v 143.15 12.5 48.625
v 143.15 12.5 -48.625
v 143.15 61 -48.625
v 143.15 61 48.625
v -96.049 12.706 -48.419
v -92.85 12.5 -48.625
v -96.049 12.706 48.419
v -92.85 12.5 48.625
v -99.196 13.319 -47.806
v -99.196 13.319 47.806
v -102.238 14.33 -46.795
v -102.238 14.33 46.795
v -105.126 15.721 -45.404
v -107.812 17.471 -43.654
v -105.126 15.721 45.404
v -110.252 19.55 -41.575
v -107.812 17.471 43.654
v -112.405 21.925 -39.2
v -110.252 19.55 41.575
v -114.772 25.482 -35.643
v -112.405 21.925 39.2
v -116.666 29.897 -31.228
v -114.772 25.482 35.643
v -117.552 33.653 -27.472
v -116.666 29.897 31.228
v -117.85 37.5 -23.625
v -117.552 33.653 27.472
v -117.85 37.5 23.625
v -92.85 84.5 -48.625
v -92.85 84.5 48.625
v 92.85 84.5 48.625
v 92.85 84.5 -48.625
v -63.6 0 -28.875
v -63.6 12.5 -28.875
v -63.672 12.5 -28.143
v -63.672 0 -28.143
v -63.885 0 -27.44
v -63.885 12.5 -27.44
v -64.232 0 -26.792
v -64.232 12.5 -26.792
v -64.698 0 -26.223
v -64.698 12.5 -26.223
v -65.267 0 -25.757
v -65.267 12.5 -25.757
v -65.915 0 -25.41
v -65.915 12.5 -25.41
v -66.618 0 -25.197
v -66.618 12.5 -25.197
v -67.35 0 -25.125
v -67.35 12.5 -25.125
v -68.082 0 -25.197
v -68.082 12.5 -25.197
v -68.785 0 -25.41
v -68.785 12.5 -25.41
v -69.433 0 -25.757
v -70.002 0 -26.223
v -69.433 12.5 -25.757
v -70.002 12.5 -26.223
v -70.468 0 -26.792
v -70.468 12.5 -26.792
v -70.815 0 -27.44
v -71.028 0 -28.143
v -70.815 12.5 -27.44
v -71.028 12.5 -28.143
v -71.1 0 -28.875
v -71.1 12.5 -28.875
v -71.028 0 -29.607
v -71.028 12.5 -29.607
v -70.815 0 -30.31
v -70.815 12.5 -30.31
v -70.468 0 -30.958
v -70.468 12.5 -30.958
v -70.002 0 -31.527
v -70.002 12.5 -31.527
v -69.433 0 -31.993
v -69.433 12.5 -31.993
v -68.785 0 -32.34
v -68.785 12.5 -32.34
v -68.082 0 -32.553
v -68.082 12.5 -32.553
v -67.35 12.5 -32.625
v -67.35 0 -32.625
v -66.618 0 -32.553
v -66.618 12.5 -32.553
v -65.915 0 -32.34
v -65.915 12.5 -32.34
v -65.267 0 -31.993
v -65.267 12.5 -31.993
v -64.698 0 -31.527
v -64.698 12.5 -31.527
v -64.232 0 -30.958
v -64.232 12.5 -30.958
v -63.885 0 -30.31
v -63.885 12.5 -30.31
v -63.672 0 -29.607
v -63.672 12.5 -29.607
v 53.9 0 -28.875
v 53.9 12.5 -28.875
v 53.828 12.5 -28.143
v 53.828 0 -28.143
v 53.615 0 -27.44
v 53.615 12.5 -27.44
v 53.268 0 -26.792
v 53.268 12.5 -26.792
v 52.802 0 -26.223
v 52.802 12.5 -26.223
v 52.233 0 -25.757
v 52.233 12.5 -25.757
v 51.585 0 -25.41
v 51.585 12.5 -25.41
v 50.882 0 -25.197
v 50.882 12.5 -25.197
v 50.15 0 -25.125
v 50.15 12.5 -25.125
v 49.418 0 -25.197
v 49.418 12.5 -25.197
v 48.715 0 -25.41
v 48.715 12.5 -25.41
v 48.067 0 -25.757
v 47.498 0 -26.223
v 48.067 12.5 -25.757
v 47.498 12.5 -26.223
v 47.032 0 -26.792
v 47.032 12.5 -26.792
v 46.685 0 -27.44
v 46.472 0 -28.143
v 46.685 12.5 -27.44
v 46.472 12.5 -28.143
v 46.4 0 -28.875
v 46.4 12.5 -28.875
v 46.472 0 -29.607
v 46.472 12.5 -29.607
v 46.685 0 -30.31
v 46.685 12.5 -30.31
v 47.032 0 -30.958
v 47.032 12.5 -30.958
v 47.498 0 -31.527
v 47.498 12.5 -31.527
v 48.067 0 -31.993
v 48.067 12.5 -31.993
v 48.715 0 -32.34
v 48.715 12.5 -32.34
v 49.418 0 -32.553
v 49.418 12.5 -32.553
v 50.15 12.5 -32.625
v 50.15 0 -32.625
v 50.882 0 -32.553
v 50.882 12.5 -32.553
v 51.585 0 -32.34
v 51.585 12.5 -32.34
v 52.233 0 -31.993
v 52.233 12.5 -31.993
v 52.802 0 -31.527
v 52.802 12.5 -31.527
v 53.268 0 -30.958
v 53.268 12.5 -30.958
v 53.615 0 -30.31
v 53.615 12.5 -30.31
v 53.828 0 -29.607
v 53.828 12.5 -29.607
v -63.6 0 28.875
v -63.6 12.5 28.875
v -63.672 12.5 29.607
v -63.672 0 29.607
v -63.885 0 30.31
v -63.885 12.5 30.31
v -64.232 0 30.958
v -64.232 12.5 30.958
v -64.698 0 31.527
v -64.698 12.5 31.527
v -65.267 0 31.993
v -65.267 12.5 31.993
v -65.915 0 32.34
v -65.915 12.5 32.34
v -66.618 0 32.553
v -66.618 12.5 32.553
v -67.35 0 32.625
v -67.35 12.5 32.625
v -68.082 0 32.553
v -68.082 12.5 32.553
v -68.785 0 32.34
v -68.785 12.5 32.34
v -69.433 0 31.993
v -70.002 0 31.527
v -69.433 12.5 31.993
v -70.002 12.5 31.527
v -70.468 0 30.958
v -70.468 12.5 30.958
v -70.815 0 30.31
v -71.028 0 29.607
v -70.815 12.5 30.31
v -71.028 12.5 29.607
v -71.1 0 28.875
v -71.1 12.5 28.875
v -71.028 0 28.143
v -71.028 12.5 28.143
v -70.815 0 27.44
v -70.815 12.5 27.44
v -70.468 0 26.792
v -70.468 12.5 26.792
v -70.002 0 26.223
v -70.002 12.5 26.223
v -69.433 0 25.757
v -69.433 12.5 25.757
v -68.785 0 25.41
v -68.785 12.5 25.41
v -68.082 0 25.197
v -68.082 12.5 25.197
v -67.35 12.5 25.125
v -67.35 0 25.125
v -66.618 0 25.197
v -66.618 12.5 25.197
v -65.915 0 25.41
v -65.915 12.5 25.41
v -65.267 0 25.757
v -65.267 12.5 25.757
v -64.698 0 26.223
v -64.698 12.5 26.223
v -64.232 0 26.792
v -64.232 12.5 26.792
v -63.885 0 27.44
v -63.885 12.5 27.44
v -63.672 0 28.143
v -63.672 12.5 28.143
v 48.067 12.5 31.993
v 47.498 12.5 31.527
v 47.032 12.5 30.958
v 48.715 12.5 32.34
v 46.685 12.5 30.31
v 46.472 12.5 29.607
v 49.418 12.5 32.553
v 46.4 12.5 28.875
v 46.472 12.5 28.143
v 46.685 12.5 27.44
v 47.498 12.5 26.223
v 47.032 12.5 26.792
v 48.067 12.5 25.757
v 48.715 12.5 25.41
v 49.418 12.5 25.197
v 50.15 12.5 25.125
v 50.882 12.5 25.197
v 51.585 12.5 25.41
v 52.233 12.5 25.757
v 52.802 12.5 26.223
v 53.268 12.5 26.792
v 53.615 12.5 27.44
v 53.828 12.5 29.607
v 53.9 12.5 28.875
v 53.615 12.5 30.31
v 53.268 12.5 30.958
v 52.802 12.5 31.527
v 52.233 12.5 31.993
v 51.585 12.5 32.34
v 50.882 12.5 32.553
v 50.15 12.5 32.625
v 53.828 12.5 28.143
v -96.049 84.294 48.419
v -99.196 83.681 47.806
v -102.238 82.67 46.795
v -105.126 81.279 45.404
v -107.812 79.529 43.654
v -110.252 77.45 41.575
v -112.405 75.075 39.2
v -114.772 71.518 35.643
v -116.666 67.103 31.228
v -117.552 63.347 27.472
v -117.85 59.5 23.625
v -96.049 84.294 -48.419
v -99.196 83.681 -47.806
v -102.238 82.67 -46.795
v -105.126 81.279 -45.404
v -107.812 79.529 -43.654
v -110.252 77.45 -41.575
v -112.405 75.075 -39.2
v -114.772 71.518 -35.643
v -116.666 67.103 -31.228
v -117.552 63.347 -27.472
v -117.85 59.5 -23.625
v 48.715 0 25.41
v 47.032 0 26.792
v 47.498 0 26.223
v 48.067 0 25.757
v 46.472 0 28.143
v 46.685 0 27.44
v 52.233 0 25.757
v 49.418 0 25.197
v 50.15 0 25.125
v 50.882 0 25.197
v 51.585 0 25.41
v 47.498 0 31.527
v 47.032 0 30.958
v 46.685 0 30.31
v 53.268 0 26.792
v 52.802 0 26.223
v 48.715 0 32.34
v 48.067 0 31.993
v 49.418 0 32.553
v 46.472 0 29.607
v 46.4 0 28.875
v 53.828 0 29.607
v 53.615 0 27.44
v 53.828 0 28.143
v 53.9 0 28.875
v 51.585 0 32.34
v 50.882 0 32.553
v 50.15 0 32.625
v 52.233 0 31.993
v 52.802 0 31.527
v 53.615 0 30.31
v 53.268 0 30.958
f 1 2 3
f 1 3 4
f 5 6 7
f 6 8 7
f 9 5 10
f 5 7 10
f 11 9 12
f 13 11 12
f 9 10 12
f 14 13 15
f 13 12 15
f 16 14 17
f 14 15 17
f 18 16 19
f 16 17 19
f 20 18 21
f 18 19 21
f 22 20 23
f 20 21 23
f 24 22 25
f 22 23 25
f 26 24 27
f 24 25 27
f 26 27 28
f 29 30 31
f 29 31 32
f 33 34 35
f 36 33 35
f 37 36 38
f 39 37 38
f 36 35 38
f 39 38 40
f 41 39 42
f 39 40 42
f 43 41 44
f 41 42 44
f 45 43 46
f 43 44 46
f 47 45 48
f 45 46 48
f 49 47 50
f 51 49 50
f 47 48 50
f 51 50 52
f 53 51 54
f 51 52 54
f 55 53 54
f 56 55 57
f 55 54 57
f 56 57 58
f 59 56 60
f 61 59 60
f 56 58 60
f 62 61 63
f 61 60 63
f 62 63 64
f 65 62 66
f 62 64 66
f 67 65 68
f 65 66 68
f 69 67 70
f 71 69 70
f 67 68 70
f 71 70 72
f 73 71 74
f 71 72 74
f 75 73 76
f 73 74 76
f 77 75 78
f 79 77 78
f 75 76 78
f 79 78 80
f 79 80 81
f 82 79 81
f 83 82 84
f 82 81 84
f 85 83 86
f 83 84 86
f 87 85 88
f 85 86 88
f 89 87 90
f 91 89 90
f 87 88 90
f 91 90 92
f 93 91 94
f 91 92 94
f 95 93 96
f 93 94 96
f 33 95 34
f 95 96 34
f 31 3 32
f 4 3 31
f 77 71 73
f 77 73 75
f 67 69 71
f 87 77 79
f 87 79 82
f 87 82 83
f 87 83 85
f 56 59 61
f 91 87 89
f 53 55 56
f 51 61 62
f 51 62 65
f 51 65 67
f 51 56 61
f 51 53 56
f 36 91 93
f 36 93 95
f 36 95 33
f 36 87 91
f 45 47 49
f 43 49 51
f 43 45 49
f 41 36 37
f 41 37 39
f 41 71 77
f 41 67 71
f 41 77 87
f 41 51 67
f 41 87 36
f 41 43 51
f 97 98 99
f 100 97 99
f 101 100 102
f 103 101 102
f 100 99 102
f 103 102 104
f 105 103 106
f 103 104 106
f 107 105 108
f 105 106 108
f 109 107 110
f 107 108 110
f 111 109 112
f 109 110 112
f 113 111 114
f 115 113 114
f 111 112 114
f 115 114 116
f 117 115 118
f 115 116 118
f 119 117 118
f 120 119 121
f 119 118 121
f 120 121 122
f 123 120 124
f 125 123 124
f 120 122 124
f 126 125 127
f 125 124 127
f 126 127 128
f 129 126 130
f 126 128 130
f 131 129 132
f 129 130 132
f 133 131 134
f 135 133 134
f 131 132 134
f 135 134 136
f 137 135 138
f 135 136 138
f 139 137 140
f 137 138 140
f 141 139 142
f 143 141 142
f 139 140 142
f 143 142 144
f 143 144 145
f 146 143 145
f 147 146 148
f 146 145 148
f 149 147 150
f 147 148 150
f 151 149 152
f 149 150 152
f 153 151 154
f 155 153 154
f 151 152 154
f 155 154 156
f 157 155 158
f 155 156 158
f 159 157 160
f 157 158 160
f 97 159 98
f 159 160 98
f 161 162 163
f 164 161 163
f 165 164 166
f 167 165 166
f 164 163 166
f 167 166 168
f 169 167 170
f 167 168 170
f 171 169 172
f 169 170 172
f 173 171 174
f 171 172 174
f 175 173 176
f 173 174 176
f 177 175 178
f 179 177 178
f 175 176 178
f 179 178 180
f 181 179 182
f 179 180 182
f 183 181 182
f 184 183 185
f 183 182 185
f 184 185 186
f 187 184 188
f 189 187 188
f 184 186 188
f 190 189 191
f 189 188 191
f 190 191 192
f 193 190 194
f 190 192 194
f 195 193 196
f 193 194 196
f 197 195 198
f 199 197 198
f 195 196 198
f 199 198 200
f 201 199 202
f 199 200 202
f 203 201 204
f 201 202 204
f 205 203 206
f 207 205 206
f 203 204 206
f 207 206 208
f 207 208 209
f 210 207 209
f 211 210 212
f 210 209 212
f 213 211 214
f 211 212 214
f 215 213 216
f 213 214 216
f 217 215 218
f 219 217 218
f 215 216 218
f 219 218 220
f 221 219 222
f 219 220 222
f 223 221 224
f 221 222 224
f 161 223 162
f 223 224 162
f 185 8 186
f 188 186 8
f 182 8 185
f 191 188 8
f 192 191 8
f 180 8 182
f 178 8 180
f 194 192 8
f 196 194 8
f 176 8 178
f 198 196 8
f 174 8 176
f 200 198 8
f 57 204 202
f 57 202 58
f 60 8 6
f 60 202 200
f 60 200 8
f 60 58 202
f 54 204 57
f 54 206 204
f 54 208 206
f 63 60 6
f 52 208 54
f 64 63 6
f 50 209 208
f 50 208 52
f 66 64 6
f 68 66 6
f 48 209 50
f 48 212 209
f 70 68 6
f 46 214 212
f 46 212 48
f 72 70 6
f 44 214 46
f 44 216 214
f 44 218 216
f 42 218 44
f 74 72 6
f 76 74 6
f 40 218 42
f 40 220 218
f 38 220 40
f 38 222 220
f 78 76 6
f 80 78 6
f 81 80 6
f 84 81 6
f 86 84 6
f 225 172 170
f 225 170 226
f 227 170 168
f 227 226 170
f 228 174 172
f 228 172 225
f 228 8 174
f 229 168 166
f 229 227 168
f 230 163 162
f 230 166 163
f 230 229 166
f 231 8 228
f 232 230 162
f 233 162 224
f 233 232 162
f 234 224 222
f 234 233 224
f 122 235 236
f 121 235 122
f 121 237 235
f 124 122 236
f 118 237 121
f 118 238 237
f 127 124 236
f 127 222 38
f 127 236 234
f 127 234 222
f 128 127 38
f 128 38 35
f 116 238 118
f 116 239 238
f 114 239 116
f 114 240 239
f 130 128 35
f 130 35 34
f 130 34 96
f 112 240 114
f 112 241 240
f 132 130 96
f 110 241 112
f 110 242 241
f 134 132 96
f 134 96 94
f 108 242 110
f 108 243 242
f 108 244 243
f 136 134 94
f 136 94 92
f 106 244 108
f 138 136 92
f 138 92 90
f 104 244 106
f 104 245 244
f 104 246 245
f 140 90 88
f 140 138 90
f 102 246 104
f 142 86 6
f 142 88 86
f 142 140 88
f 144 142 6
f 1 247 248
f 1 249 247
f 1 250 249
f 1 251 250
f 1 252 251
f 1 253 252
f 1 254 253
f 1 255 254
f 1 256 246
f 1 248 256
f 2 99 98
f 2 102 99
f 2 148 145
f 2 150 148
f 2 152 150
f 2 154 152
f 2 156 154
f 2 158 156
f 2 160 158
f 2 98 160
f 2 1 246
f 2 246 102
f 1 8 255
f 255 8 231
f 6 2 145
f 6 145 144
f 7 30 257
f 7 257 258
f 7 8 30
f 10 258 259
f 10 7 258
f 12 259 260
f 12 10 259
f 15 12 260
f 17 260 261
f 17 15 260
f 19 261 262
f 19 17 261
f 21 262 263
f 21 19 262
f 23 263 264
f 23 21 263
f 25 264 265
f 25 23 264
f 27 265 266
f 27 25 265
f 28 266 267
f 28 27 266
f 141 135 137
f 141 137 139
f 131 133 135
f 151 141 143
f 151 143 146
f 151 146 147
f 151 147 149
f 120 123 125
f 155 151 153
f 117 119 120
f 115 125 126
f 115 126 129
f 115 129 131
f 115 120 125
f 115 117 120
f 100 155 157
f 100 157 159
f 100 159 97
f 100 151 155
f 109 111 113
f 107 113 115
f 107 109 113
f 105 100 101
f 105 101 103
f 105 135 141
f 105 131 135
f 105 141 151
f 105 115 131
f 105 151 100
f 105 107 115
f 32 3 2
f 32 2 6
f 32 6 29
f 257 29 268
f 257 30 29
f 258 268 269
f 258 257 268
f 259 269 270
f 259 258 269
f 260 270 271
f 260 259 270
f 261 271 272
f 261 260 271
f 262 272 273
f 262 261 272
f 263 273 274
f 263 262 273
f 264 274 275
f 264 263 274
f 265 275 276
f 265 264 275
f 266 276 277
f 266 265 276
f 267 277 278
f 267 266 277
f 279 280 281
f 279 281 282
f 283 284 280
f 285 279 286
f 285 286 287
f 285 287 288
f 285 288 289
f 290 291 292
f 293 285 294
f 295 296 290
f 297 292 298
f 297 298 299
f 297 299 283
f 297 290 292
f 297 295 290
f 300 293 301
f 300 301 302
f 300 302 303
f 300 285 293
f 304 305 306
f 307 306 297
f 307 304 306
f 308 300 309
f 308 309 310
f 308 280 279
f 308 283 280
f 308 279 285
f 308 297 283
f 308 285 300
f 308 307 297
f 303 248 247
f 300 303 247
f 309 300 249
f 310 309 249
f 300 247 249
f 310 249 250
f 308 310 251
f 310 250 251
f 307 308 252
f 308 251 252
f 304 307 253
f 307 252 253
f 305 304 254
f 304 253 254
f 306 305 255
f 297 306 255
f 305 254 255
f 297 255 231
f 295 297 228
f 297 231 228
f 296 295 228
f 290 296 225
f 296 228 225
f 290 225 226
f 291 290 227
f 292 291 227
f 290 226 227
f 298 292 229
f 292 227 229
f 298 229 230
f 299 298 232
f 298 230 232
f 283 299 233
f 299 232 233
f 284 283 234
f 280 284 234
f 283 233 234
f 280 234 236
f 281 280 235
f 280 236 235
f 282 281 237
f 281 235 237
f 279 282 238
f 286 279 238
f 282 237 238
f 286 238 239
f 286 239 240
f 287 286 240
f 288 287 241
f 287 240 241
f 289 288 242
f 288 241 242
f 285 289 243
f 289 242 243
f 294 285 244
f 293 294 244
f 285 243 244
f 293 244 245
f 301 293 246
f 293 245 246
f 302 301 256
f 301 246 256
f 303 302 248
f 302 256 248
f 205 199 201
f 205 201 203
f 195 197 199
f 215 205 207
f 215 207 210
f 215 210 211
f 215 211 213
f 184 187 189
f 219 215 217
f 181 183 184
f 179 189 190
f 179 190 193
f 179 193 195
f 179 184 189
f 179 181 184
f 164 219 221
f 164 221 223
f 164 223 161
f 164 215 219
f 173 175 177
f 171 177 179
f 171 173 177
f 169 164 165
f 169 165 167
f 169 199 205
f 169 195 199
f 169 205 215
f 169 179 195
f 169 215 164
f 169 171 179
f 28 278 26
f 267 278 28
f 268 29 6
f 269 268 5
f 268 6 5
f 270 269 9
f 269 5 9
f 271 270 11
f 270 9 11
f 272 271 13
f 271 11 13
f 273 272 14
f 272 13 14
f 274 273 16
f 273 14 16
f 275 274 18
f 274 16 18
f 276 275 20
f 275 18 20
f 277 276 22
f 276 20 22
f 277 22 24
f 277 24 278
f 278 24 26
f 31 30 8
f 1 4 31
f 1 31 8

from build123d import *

# Parameters (mm, degrees)
F1_W       = 185.7
F1_H       = 97.25
F2_DEPTH   = 72
F2_FACE_W  = 72
F2_FACE_H  = 97.25
F4_W       = 72
F4_H       = 97.25
F6_R       = 25
F2_FACE1_W = 72
F2_FACE1_H = 97.25
F8_W       = 48.5
F8_H       = 97.25
F10_R      = 3.75
F11_DEPTH  = 12.5


with BuildPart() as f2:
    # F1 (on offset) → F2 (new body)
    with BuildSketch(Plane.XZ.offset(-84.5)):
        Rectangle(F1_W, F1_H)
    extrude(amount=F2_DEPTH)

    # F2_face (on face) → F5 section 0
    with BuildSketch(Plane(origin=(-92.85, 48.5, 0), x_dir=(0, -1, 0), z_dir=(-1, 0, 0))):
        Rectangle(F2_FACE_W, F2_FACE_H)
    # F4 (on offset) → F5 section 1
    with BuildSketch(Plane(origin=(-117.85, 0, 0), x_dir=(0, -1, 0), z_dir=(-1, 0, 0))):
        with Locations((-48.5, 0)):
            Rectangle(F4_W, F4_H)
    loft()

    # F6
    f6_edges = [f2.edges().sort_by_distance(p)[0] for p in [
        (-117.85, 84.5, 0),
        (-117.85, 12.5, 0),
        (-117.85, 48.5, 48.625),
        (-117.85, 48.5, -48.625),
    ]]
    fillet(f6_edges, radius=F6_R)

    # F2_face1 (on face) → F9 section 0
    with BuildSketch(Plane(origin=(92.85, 48.5, 0), x_dir=(0, 1, 0), z_dir=(1, 0, 0))):
        Rectangle(F2_FACE1_W, F2_FACE1_H)
    # F8 (on offset) → F9 section 1
    with BuildSketch(Plane.YZ.offset(143.15)):
        with Locations((36.75, 0)):
            Rectangle(F8_W, F8_H)
    loft()

    # F10 (on face) → F11 (join)
    with BuildSketch(Plane.XZ.offset(-12.5)):
        with Locations((-67.35, -28.875)):
            Circle(F10_R)
        with Locations((50.15, -28.875)):
            Circle(F10_R)
        with Locations((50.15, 28.875)):
            Circle(F10_R)
        with Locations((-67.35, 28.875)):
            Circle(F10_R)
    extrude(amount=F11_DEPTH)


solid = f2.part
